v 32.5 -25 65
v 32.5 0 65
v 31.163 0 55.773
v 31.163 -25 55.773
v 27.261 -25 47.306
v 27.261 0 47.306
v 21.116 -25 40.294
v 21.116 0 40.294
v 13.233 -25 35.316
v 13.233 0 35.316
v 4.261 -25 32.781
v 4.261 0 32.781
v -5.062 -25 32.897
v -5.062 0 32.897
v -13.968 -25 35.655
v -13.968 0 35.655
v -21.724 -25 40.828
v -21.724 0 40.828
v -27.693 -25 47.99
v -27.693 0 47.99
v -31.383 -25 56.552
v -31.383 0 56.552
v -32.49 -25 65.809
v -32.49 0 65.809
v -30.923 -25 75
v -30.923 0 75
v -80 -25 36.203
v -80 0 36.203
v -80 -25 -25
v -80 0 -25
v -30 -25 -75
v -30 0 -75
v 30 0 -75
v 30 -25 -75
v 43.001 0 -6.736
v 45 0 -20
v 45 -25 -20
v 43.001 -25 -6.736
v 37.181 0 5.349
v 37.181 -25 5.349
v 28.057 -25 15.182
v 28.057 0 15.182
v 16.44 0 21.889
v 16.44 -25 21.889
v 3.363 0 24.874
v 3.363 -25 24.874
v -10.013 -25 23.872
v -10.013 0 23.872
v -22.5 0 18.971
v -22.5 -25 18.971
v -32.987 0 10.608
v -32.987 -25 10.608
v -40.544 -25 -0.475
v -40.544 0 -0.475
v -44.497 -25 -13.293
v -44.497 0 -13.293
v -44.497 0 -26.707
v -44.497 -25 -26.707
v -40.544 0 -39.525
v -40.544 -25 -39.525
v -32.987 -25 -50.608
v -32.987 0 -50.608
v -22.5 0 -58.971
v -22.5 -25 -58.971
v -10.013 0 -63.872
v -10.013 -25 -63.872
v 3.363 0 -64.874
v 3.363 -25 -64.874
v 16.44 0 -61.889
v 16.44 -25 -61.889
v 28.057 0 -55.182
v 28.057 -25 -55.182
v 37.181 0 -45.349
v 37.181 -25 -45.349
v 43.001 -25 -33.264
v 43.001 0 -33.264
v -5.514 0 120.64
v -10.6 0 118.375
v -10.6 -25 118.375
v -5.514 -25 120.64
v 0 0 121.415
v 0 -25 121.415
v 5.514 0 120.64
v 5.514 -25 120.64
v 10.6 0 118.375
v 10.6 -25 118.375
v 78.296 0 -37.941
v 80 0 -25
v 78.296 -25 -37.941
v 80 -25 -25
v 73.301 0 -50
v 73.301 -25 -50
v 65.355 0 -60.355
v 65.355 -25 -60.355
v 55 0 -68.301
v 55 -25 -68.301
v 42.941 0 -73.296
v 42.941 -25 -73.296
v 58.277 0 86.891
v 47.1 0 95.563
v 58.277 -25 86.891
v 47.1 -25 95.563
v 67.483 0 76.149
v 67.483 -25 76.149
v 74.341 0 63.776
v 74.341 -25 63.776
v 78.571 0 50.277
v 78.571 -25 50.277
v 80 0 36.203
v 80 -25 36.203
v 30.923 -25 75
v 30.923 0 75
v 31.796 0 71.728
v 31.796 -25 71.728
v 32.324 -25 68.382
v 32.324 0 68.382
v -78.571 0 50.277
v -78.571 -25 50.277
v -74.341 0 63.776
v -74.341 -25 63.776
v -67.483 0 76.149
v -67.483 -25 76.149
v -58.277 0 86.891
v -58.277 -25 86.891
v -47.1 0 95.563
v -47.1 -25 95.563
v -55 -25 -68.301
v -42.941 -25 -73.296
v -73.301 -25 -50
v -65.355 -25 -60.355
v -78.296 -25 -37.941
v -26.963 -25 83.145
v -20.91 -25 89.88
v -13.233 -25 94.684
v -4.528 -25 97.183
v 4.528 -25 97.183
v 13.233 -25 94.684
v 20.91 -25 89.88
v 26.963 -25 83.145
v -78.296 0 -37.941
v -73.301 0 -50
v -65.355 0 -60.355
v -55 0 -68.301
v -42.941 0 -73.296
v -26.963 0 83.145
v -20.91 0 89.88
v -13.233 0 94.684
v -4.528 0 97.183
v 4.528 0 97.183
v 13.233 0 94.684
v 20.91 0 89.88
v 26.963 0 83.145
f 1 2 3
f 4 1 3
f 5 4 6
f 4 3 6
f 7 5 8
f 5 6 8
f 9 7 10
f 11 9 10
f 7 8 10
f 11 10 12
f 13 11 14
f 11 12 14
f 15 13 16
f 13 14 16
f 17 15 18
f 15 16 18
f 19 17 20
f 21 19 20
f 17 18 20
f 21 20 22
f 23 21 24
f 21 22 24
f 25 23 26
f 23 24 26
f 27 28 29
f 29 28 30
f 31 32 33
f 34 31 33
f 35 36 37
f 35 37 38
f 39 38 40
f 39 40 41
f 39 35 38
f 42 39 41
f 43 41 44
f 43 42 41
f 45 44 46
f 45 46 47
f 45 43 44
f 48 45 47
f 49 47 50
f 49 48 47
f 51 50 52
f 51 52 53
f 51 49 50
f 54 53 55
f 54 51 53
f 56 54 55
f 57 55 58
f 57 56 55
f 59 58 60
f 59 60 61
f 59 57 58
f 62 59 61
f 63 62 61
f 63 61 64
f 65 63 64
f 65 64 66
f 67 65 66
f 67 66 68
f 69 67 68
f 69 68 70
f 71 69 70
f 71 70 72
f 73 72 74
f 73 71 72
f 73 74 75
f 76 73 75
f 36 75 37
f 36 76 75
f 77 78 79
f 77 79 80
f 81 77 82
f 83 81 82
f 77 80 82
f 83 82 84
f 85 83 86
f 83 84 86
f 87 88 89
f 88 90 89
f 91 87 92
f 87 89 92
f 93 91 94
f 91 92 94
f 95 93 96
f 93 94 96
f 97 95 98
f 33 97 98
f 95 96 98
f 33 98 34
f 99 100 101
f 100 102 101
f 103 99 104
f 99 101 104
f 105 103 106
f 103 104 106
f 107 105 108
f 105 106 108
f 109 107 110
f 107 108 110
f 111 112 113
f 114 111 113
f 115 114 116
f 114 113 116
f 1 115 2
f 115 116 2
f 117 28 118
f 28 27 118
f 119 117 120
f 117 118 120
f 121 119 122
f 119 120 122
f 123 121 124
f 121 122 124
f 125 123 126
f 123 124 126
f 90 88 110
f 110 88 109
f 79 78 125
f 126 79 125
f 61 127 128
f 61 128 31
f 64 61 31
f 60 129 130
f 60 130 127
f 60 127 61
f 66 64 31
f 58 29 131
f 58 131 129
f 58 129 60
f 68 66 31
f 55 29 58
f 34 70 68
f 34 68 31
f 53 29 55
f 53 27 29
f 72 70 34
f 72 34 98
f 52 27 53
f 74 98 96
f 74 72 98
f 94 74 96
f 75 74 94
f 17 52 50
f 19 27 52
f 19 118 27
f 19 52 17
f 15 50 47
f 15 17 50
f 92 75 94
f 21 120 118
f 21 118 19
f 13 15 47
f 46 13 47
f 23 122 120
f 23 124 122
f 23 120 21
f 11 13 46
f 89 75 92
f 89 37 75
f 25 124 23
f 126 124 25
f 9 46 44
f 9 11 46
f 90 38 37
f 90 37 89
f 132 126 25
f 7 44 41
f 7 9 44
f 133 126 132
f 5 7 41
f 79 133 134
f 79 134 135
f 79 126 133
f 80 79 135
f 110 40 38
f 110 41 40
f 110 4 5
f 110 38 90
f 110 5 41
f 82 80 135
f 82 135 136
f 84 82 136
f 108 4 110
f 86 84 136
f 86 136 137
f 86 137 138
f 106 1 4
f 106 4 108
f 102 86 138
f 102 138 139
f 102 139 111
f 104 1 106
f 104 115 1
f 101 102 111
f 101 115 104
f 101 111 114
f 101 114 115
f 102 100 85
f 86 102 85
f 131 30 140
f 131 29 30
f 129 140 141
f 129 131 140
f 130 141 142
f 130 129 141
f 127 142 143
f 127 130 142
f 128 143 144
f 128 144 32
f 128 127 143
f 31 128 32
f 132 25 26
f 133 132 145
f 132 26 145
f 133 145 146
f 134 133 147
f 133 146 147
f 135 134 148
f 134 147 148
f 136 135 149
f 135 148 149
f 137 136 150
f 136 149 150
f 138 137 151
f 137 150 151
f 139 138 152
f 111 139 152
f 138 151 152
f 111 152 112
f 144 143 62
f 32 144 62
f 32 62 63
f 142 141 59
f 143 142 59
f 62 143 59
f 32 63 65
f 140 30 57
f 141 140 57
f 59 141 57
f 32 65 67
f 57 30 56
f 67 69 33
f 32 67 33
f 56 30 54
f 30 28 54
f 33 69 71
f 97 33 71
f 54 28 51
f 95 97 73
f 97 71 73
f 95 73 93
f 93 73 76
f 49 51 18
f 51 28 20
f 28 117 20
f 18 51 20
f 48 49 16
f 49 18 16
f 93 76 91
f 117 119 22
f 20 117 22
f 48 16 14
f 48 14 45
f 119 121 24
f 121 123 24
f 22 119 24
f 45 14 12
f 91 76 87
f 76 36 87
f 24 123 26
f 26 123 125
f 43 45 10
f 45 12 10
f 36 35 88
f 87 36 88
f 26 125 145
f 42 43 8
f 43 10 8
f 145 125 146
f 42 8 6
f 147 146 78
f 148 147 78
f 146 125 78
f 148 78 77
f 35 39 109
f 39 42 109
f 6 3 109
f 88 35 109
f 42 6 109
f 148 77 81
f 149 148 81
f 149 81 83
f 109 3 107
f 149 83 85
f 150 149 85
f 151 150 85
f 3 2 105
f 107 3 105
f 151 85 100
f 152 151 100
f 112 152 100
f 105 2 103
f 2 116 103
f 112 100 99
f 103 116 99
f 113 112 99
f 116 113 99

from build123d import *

# Parameters (mm, degrees)
F0_R     = 45
F1_DEPTH = 25
F2_R     = 50
F3_R     = 70
F4_R     = 20


with BuildPart() as f1:
    # F0 (on Front) → F1 (new body)
    with BuildSketch(Plane.XZ):
        with BuildLine():
            Line((0, 125), (-80, 75))
            Line((-80, 75), (-30.923292, 75))
            ThreePointArc((-30.923292, 75), (0, 97.5), (30.923292, 75))
            Line((30.923292, 75), (80, 75))
            Line((80, 75), (0, 125))
        make_face()
        with BuildLine():
            Line((-30.923292, 75), (-80, 75))
            Line((-80, 75), (-80, -75))
            Line((-80, -75), (80, -75))
            Line((80, -75), (80, 75))
            Line((80, 75), (30.923292, 75))
            ThreePointArc((30.923292, 75), (32.103403, 70.061769), (32.5, 65))
            ThreePointArc((32.5, 65), (-5.061769, 32.896597), (-30.923292, 75))
        make_face()
        with Locations((0, -20)):
            Circle(F0_R, mode=Mode.SUBTRACT)
    extrude(amount=F1_DEPTH)

    # F2
    f2_edges = [f1.edges().sort_by_distance(p)[0] for p in [
        (-80, -12.5, -75),
        (80, -12.5, -75),
    ]]
    fillet(f2_edges, radius=F2_R)

    # F3
    f3_edges = [f1.edges().sort_by_distance(p)[0] for p in [
        (80, -12.5, 75),
        (-80, -12.5, 75),
    ]]
    fillet(f3_edges, radius=F3_R)

    # F4
    f4_edges = [f1.edges().sort_by_distance(p)[0] for p in [
        (0, -12.5, 125),
    ]]
    fillet(f4_edges, radius=F4_R)


solid = f1.part
